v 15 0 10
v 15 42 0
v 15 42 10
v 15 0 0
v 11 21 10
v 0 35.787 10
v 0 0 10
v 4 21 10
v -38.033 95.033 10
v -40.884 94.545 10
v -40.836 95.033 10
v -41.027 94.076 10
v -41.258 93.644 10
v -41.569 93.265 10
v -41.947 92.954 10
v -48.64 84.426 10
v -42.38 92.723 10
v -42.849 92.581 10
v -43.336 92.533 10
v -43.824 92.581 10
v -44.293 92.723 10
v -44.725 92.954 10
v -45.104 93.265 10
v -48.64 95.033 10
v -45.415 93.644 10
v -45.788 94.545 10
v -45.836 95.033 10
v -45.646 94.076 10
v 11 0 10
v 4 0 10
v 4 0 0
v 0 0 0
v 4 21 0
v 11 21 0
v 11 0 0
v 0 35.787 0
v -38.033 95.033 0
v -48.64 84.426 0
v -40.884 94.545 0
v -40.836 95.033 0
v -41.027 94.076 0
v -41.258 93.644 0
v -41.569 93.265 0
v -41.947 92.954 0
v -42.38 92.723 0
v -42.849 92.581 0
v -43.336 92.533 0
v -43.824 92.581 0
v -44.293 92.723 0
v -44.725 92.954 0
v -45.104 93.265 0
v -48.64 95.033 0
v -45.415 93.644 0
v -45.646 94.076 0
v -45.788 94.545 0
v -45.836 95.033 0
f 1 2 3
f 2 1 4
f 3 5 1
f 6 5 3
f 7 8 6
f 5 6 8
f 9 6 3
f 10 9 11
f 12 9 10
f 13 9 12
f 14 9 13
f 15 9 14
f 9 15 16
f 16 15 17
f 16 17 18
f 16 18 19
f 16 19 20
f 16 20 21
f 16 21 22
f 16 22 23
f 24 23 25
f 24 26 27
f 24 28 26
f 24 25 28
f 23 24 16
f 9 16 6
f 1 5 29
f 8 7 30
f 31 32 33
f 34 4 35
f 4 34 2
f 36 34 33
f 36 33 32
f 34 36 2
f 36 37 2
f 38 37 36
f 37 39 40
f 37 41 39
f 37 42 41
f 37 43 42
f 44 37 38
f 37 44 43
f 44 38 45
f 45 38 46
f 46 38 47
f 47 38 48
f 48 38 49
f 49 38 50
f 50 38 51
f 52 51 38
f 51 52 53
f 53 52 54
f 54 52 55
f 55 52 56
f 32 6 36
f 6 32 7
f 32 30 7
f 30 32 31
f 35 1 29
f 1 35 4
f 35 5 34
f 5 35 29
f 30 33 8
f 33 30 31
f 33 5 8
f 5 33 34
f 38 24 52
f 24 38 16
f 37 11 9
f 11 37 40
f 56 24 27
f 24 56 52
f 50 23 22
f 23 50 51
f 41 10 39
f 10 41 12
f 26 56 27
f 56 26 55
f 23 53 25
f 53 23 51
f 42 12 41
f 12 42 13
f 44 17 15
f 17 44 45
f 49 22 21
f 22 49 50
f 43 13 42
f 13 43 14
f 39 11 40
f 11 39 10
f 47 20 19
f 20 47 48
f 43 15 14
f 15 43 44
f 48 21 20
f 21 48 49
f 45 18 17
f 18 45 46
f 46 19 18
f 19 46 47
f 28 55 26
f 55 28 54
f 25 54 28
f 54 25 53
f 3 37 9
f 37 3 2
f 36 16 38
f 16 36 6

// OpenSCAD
$fn = 31+1;

// Customizable spool holder

// preview[view:south, tilt:top]

// thickness of your frame (in mm)
thickness = 7;
depth = thickness + 8;
center = depth/2;

// width of the holder (in mm)
width = 10;

// lenth of the holder clip (in mm)
frame = 21;

// diameter of your spool (in mm)
diameter = 150;
spool = diameter/2;
rectangle = frame*2;

// size of the rod that hold your spool (in mm)
rod = 5;
x = depth-cos(45)*depth;

rotate (0, 0, 0){
    difference () {
        cube ([depth, rectangle, width]);
        translate([center-thickness/2,-1,-0.5]){
            cube ([thickness, frame+1, width+1]);
        }}
    translate ([depth, rectangle, 0]){
        rotate ([0, 0, 135]){
            cube ([spool, depth, width]);
            }
        }
    difference (){
        translate ([-cos(45)*spool+x, rectangle-cos(45)*depth+cos(45)*spool, 0]){
            cube ([cos(45)*depth, cos(45)*depth, width]);
        }
        translate ([-cos(45)*spool+x+cos(45)*depth/2, rectangle-cos(45)*depth+cos(45)*spool+cos(45)*depth, -0.5]){
            cylinder (width+1, d = rod);
        }
        }}
